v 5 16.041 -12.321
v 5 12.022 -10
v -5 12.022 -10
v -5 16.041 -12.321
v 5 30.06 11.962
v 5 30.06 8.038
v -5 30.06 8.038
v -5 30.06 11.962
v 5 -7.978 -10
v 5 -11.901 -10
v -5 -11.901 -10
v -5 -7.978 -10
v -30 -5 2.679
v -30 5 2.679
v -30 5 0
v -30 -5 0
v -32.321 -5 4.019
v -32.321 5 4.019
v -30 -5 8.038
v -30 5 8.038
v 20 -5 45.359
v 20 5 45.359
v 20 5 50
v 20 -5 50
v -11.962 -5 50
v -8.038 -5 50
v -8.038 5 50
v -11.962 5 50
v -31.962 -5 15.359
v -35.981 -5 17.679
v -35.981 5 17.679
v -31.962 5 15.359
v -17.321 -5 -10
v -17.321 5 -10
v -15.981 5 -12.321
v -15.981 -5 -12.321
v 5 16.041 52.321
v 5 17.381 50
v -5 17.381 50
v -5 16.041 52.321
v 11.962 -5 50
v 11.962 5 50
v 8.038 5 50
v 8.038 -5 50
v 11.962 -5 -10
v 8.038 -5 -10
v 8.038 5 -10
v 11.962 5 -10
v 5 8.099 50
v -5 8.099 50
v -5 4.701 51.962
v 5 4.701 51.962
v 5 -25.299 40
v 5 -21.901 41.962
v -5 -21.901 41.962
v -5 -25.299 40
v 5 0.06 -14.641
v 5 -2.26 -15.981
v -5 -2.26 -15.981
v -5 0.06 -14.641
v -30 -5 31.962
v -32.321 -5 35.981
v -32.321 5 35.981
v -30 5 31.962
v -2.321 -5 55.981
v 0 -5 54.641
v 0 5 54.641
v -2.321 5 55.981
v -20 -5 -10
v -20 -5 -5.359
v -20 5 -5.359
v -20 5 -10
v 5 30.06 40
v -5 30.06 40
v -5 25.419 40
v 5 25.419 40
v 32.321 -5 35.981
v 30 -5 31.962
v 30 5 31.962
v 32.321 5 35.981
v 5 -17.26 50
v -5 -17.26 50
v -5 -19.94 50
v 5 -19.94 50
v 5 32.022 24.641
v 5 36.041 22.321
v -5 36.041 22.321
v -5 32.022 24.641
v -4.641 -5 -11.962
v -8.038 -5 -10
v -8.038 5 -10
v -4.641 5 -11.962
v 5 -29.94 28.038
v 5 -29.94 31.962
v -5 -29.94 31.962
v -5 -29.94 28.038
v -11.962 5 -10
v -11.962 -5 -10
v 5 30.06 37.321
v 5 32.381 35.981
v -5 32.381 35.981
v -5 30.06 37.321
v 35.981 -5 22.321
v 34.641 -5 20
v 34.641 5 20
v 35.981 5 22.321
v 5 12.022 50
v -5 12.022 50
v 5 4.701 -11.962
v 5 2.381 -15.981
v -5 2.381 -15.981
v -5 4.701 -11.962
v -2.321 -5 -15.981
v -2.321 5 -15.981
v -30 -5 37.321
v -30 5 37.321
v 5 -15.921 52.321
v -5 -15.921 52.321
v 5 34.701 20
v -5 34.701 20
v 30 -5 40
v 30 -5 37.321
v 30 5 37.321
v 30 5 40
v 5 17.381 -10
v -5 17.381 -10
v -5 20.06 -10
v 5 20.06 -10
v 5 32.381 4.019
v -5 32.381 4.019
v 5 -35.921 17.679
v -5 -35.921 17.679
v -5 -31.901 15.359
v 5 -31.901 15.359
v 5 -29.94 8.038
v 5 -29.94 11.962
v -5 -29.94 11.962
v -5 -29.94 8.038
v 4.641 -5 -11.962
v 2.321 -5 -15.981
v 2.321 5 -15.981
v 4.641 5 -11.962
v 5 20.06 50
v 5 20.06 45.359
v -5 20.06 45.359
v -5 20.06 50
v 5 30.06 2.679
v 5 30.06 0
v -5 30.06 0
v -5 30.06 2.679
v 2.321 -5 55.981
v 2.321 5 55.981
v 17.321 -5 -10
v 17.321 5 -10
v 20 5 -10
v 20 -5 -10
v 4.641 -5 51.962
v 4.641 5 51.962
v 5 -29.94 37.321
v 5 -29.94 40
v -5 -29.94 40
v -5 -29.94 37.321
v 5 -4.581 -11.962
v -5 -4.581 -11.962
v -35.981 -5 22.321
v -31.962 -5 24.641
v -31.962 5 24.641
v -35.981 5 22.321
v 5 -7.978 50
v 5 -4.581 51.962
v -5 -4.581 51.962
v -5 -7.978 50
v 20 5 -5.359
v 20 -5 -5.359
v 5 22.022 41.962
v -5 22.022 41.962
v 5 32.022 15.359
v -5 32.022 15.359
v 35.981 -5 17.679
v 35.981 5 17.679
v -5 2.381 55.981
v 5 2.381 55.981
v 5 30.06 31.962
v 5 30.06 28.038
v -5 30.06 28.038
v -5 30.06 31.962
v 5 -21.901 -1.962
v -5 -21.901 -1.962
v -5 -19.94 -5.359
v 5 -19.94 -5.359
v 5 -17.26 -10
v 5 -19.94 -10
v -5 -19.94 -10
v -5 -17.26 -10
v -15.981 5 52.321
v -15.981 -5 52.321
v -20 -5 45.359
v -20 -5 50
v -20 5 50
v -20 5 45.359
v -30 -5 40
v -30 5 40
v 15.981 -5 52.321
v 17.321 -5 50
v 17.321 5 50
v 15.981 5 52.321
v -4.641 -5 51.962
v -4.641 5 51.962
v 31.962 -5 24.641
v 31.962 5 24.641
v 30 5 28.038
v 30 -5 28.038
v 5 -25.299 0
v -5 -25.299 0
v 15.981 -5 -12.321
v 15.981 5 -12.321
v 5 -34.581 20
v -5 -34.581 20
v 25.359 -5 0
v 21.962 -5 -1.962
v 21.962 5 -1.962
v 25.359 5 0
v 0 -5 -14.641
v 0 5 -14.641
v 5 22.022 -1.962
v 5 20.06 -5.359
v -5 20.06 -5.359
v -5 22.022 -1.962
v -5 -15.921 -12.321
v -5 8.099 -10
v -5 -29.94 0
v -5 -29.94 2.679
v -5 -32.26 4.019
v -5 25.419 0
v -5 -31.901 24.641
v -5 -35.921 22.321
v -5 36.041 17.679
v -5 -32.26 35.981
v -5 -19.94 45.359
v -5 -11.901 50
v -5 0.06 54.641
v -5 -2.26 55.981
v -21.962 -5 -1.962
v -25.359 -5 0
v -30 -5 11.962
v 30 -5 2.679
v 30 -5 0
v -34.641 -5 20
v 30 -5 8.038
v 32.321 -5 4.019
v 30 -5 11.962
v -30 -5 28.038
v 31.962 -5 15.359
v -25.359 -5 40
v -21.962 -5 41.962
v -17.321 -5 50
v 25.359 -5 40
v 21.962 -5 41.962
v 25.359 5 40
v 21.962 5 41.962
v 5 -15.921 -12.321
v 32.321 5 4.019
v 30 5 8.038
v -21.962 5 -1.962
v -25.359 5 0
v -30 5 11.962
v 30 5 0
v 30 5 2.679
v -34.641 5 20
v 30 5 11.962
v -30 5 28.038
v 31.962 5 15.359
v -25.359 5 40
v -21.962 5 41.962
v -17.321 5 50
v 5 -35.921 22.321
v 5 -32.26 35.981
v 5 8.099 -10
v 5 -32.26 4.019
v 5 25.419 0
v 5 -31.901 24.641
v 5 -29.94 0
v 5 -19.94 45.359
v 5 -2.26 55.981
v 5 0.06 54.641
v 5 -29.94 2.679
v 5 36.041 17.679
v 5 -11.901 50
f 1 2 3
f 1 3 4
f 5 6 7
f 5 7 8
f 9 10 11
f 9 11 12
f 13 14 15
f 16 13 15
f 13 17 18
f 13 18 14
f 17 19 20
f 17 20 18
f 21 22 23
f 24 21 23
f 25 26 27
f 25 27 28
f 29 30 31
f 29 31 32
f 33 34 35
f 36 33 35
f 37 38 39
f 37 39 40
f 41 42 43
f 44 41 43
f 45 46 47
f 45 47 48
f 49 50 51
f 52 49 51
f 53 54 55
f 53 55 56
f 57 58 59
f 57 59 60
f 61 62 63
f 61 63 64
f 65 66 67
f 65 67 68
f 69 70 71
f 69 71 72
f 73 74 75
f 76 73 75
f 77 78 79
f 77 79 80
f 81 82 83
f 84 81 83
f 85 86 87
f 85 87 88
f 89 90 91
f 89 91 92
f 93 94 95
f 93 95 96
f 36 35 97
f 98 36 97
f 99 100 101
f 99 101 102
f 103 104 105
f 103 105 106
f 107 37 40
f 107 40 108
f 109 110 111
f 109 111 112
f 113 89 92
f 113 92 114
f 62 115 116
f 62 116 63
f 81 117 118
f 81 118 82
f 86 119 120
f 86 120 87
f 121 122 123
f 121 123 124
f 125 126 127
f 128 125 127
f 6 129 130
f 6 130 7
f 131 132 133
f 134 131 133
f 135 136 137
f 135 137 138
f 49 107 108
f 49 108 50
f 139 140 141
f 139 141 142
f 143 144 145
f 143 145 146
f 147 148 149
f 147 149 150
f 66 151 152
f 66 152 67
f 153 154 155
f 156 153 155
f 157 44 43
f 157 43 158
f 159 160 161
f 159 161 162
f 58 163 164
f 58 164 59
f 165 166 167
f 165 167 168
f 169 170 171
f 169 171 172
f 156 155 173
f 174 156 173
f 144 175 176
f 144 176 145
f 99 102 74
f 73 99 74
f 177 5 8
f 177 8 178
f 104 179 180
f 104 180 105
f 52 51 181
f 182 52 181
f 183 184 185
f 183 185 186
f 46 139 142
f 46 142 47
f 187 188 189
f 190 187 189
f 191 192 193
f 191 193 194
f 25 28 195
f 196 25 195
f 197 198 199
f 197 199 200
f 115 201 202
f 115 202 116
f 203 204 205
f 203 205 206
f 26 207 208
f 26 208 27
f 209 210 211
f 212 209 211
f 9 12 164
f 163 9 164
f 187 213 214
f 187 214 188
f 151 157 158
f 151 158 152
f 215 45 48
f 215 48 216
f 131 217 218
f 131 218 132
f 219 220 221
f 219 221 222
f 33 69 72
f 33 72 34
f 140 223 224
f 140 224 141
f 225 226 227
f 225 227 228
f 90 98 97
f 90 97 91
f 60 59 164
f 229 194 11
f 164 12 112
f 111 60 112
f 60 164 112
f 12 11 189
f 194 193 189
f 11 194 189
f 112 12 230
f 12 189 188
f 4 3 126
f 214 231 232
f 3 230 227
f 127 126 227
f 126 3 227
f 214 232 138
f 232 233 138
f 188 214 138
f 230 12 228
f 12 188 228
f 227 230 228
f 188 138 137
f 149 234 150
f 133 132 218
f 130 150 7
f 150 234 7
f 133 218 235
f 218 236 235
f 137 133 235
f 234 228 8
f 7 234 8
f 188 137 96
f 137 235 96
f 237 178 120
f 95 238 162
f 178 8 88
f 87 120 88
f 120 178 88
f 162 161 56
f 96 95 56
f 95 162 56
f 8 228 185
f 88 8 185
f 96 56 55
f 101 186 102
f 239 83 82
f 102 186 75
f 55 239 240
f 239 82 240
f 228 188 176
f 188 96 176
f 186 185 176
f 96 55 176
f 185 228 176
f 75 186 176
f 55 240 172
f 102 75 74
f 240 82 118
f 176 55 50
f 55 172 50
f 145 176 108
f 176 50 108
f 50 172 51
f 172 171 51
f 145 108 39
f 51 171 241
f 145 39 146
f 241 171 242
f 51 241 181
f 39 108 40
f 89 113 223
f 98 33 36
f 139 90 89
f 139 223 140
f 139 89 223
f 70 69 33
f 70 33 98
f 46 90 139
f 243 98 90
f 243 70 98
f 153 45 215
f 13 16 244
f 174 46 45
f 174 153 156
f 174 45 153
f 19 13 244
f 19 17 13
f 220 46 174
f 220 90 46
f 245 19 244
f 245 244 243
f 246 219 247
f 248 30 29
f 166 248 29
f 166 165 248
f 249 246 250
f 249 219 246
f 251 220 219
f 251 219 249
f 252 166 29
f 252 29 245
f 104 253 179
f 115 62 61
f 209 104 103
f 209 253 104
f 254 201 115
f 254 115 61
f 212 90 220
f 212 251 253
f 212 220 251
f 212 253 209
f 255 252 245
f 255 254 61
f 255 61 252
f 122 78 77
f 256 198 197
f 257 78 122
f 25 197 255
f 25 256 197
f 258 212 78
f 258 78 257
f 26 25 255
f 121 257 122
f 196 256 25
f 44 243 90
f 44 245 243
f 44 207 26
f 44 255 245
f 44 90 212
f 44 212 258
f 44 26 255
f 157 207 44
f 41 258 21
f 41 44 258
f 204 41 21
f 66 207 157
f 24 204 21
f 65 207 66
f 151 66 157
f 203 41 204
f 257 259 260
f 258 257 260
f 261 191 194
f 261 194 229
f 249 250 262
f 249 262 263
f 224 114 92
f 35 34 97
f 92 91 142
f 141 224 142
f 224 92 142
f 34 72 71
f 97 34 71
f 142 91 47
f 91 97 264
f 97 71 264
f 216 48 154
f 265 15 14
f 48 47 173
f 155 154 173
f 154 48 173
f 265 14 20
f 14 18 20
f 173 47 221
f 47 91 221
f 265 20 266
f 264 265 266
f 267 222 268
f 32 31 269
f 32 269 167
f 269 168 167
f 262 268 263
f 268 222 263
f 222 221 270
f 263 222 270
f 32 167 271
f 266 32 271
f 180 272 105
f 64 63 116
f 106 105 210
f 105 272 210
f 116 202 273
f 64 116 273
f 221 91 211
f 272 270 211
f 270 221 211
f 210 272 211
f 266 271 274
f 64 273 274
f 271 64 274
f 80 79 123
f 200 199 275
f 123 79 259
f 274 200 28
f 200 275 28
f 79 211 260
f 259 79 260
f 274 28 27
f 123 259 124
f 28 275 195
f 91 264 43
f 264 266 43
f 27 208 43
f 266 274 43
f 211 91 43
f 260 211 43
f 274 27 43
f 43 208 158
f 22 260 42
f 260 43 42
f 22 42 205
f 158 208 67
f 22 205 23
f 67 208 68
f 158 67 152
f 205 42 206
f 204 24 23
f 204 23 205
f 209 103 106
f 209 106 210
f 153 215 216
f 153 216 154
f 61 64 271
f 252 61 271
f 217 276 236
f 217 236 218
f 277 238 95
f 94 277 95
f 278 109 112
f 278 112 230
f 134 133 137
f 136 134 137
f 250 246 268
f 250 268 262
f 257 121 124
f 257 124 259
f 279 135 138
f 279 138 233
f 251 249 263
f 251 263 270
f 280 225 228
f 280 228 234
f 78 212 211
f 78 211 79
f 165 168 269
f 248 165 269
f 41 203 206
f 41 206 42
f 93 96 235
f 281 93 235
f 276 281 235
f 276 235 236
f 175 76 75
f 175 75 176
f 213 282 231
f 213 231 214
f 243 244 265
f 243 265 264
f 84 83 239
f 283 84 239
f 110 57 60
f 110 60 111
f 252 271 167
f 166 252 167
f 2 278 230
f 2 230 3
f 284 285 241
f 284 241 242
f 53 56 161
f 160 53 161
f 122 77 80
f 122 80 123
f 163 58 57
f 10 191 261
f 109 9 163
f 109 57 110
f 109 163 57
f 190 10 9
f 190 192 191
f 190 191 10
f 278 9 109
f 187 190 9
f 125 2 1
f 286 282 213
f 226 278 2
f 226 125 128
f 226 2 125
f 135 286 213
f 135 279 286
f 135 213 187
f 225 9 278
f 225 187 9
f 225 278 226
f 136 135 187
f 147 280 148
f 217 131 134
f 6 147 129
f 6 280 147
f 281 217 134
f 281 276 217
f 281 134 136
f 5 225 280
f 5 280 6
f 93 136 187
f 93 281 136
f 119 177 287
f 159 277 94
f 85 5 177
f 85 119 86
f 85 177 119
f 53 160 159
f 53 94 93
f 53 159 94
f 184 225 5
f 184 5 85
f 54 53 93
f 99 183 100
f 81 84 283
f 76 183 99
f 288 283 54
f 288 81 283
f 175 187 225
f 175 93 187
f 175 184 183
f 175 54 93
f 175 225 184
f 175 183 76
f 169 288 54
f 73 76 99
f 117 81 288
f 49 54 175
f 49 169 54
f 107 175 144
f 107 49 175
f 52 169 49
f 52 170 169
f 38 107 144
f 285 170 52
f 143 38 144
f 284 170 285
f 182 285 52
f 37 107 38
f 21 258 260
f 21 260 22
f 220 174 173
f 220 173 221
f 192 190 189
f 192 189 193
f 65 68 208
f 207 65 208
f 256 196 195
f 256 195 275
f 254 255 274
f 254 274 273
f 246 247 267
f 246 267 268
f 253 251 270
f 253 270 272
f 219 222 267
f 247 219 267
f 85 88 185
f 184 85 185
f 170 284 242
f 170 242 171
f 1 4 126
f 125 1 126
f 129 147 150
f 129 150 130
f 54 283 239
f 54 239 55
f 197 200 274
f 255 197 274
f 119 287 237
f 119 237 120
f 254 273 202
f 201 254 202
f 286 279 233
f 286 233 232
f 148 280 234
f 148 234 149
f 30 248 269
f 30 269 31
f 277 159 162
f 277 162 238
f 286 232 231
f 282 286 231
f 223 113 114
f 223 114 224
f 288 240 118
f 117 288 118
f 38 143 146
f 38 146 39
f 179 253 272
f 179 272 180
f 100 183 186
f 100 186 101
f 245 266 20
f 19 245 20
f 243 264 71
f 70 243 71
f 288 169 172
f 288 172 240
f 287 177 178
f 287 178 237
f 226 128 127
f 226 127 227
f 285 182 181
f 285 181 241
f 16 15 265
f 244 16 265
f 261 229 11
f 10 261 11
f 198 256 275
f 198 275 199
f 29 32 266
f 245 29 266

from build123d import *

# Parameters (mm, degrees)
F1_DEPTH = 5
F2_COUNT = 12
F4_DEPTH = 5
F5_COUNT = 12


with BuildPart() as f1:
    # F0 (on Front) → F1 (new body, symmetric)
    with BuildSketch(Plane.XZ):
        with BuildLine():
            Line((-30, 0), (0, 0))
            Line((0, 0), (0, 20))
            ThreePointArc((0, 20), (-17.5, 22.5), (-15, 40))
            Line((-15, 40), (-30, 40))
            Line((-30, 40), (-30, 0))
        make_face()
    extrude(amount=F1_DEPTH, both=True)

    # F2: F1 ×12 about axis
    f2_axis = Axis((0, 0, 20), (0, 1, 0))


with BuildPart() as f1_1:
    add(f1.part)
    for i in range(1, F2_COUNT):
        add(f1.part.rotate(f2_axis, i * 360 / F2_COUNT))


with BuildPart() as f4:
    # F3 (on Right) → F4 (new body, symmetric)
    with BuildSketch(Plane.YZ):
        with BuildLine():
            Line((-29.9398601055, 0), (0.0601398945, 0))
            Line((0.0601398945, 0), (0.0601398945, 20))
            ThreePointArc((0.0601398945, 20), (-17.4398601055, 22.5), (-14.9398601055, 40))
            Line((-14.9398601055, 40), (-29.9398601055, 40))
            Line((-29.9398601055, 40), (-29.9398601055, 0))
        make_face()
    extrude(amount=F4_DEPTH, both=True)

    # F5: F4 ×12 about axis
    f5_axis = Axis((0, 0.0601398945, 20), (-1, 0, 0))


with BuildPart() as f4_1:
    add(f4.part)
    for i in range(1, F5_COUNT):
        add(f4.part.rotate(f5_axis, i * 360 / F5_COUNT))


solid = Compound([f1_1.part, f4_1.part])
